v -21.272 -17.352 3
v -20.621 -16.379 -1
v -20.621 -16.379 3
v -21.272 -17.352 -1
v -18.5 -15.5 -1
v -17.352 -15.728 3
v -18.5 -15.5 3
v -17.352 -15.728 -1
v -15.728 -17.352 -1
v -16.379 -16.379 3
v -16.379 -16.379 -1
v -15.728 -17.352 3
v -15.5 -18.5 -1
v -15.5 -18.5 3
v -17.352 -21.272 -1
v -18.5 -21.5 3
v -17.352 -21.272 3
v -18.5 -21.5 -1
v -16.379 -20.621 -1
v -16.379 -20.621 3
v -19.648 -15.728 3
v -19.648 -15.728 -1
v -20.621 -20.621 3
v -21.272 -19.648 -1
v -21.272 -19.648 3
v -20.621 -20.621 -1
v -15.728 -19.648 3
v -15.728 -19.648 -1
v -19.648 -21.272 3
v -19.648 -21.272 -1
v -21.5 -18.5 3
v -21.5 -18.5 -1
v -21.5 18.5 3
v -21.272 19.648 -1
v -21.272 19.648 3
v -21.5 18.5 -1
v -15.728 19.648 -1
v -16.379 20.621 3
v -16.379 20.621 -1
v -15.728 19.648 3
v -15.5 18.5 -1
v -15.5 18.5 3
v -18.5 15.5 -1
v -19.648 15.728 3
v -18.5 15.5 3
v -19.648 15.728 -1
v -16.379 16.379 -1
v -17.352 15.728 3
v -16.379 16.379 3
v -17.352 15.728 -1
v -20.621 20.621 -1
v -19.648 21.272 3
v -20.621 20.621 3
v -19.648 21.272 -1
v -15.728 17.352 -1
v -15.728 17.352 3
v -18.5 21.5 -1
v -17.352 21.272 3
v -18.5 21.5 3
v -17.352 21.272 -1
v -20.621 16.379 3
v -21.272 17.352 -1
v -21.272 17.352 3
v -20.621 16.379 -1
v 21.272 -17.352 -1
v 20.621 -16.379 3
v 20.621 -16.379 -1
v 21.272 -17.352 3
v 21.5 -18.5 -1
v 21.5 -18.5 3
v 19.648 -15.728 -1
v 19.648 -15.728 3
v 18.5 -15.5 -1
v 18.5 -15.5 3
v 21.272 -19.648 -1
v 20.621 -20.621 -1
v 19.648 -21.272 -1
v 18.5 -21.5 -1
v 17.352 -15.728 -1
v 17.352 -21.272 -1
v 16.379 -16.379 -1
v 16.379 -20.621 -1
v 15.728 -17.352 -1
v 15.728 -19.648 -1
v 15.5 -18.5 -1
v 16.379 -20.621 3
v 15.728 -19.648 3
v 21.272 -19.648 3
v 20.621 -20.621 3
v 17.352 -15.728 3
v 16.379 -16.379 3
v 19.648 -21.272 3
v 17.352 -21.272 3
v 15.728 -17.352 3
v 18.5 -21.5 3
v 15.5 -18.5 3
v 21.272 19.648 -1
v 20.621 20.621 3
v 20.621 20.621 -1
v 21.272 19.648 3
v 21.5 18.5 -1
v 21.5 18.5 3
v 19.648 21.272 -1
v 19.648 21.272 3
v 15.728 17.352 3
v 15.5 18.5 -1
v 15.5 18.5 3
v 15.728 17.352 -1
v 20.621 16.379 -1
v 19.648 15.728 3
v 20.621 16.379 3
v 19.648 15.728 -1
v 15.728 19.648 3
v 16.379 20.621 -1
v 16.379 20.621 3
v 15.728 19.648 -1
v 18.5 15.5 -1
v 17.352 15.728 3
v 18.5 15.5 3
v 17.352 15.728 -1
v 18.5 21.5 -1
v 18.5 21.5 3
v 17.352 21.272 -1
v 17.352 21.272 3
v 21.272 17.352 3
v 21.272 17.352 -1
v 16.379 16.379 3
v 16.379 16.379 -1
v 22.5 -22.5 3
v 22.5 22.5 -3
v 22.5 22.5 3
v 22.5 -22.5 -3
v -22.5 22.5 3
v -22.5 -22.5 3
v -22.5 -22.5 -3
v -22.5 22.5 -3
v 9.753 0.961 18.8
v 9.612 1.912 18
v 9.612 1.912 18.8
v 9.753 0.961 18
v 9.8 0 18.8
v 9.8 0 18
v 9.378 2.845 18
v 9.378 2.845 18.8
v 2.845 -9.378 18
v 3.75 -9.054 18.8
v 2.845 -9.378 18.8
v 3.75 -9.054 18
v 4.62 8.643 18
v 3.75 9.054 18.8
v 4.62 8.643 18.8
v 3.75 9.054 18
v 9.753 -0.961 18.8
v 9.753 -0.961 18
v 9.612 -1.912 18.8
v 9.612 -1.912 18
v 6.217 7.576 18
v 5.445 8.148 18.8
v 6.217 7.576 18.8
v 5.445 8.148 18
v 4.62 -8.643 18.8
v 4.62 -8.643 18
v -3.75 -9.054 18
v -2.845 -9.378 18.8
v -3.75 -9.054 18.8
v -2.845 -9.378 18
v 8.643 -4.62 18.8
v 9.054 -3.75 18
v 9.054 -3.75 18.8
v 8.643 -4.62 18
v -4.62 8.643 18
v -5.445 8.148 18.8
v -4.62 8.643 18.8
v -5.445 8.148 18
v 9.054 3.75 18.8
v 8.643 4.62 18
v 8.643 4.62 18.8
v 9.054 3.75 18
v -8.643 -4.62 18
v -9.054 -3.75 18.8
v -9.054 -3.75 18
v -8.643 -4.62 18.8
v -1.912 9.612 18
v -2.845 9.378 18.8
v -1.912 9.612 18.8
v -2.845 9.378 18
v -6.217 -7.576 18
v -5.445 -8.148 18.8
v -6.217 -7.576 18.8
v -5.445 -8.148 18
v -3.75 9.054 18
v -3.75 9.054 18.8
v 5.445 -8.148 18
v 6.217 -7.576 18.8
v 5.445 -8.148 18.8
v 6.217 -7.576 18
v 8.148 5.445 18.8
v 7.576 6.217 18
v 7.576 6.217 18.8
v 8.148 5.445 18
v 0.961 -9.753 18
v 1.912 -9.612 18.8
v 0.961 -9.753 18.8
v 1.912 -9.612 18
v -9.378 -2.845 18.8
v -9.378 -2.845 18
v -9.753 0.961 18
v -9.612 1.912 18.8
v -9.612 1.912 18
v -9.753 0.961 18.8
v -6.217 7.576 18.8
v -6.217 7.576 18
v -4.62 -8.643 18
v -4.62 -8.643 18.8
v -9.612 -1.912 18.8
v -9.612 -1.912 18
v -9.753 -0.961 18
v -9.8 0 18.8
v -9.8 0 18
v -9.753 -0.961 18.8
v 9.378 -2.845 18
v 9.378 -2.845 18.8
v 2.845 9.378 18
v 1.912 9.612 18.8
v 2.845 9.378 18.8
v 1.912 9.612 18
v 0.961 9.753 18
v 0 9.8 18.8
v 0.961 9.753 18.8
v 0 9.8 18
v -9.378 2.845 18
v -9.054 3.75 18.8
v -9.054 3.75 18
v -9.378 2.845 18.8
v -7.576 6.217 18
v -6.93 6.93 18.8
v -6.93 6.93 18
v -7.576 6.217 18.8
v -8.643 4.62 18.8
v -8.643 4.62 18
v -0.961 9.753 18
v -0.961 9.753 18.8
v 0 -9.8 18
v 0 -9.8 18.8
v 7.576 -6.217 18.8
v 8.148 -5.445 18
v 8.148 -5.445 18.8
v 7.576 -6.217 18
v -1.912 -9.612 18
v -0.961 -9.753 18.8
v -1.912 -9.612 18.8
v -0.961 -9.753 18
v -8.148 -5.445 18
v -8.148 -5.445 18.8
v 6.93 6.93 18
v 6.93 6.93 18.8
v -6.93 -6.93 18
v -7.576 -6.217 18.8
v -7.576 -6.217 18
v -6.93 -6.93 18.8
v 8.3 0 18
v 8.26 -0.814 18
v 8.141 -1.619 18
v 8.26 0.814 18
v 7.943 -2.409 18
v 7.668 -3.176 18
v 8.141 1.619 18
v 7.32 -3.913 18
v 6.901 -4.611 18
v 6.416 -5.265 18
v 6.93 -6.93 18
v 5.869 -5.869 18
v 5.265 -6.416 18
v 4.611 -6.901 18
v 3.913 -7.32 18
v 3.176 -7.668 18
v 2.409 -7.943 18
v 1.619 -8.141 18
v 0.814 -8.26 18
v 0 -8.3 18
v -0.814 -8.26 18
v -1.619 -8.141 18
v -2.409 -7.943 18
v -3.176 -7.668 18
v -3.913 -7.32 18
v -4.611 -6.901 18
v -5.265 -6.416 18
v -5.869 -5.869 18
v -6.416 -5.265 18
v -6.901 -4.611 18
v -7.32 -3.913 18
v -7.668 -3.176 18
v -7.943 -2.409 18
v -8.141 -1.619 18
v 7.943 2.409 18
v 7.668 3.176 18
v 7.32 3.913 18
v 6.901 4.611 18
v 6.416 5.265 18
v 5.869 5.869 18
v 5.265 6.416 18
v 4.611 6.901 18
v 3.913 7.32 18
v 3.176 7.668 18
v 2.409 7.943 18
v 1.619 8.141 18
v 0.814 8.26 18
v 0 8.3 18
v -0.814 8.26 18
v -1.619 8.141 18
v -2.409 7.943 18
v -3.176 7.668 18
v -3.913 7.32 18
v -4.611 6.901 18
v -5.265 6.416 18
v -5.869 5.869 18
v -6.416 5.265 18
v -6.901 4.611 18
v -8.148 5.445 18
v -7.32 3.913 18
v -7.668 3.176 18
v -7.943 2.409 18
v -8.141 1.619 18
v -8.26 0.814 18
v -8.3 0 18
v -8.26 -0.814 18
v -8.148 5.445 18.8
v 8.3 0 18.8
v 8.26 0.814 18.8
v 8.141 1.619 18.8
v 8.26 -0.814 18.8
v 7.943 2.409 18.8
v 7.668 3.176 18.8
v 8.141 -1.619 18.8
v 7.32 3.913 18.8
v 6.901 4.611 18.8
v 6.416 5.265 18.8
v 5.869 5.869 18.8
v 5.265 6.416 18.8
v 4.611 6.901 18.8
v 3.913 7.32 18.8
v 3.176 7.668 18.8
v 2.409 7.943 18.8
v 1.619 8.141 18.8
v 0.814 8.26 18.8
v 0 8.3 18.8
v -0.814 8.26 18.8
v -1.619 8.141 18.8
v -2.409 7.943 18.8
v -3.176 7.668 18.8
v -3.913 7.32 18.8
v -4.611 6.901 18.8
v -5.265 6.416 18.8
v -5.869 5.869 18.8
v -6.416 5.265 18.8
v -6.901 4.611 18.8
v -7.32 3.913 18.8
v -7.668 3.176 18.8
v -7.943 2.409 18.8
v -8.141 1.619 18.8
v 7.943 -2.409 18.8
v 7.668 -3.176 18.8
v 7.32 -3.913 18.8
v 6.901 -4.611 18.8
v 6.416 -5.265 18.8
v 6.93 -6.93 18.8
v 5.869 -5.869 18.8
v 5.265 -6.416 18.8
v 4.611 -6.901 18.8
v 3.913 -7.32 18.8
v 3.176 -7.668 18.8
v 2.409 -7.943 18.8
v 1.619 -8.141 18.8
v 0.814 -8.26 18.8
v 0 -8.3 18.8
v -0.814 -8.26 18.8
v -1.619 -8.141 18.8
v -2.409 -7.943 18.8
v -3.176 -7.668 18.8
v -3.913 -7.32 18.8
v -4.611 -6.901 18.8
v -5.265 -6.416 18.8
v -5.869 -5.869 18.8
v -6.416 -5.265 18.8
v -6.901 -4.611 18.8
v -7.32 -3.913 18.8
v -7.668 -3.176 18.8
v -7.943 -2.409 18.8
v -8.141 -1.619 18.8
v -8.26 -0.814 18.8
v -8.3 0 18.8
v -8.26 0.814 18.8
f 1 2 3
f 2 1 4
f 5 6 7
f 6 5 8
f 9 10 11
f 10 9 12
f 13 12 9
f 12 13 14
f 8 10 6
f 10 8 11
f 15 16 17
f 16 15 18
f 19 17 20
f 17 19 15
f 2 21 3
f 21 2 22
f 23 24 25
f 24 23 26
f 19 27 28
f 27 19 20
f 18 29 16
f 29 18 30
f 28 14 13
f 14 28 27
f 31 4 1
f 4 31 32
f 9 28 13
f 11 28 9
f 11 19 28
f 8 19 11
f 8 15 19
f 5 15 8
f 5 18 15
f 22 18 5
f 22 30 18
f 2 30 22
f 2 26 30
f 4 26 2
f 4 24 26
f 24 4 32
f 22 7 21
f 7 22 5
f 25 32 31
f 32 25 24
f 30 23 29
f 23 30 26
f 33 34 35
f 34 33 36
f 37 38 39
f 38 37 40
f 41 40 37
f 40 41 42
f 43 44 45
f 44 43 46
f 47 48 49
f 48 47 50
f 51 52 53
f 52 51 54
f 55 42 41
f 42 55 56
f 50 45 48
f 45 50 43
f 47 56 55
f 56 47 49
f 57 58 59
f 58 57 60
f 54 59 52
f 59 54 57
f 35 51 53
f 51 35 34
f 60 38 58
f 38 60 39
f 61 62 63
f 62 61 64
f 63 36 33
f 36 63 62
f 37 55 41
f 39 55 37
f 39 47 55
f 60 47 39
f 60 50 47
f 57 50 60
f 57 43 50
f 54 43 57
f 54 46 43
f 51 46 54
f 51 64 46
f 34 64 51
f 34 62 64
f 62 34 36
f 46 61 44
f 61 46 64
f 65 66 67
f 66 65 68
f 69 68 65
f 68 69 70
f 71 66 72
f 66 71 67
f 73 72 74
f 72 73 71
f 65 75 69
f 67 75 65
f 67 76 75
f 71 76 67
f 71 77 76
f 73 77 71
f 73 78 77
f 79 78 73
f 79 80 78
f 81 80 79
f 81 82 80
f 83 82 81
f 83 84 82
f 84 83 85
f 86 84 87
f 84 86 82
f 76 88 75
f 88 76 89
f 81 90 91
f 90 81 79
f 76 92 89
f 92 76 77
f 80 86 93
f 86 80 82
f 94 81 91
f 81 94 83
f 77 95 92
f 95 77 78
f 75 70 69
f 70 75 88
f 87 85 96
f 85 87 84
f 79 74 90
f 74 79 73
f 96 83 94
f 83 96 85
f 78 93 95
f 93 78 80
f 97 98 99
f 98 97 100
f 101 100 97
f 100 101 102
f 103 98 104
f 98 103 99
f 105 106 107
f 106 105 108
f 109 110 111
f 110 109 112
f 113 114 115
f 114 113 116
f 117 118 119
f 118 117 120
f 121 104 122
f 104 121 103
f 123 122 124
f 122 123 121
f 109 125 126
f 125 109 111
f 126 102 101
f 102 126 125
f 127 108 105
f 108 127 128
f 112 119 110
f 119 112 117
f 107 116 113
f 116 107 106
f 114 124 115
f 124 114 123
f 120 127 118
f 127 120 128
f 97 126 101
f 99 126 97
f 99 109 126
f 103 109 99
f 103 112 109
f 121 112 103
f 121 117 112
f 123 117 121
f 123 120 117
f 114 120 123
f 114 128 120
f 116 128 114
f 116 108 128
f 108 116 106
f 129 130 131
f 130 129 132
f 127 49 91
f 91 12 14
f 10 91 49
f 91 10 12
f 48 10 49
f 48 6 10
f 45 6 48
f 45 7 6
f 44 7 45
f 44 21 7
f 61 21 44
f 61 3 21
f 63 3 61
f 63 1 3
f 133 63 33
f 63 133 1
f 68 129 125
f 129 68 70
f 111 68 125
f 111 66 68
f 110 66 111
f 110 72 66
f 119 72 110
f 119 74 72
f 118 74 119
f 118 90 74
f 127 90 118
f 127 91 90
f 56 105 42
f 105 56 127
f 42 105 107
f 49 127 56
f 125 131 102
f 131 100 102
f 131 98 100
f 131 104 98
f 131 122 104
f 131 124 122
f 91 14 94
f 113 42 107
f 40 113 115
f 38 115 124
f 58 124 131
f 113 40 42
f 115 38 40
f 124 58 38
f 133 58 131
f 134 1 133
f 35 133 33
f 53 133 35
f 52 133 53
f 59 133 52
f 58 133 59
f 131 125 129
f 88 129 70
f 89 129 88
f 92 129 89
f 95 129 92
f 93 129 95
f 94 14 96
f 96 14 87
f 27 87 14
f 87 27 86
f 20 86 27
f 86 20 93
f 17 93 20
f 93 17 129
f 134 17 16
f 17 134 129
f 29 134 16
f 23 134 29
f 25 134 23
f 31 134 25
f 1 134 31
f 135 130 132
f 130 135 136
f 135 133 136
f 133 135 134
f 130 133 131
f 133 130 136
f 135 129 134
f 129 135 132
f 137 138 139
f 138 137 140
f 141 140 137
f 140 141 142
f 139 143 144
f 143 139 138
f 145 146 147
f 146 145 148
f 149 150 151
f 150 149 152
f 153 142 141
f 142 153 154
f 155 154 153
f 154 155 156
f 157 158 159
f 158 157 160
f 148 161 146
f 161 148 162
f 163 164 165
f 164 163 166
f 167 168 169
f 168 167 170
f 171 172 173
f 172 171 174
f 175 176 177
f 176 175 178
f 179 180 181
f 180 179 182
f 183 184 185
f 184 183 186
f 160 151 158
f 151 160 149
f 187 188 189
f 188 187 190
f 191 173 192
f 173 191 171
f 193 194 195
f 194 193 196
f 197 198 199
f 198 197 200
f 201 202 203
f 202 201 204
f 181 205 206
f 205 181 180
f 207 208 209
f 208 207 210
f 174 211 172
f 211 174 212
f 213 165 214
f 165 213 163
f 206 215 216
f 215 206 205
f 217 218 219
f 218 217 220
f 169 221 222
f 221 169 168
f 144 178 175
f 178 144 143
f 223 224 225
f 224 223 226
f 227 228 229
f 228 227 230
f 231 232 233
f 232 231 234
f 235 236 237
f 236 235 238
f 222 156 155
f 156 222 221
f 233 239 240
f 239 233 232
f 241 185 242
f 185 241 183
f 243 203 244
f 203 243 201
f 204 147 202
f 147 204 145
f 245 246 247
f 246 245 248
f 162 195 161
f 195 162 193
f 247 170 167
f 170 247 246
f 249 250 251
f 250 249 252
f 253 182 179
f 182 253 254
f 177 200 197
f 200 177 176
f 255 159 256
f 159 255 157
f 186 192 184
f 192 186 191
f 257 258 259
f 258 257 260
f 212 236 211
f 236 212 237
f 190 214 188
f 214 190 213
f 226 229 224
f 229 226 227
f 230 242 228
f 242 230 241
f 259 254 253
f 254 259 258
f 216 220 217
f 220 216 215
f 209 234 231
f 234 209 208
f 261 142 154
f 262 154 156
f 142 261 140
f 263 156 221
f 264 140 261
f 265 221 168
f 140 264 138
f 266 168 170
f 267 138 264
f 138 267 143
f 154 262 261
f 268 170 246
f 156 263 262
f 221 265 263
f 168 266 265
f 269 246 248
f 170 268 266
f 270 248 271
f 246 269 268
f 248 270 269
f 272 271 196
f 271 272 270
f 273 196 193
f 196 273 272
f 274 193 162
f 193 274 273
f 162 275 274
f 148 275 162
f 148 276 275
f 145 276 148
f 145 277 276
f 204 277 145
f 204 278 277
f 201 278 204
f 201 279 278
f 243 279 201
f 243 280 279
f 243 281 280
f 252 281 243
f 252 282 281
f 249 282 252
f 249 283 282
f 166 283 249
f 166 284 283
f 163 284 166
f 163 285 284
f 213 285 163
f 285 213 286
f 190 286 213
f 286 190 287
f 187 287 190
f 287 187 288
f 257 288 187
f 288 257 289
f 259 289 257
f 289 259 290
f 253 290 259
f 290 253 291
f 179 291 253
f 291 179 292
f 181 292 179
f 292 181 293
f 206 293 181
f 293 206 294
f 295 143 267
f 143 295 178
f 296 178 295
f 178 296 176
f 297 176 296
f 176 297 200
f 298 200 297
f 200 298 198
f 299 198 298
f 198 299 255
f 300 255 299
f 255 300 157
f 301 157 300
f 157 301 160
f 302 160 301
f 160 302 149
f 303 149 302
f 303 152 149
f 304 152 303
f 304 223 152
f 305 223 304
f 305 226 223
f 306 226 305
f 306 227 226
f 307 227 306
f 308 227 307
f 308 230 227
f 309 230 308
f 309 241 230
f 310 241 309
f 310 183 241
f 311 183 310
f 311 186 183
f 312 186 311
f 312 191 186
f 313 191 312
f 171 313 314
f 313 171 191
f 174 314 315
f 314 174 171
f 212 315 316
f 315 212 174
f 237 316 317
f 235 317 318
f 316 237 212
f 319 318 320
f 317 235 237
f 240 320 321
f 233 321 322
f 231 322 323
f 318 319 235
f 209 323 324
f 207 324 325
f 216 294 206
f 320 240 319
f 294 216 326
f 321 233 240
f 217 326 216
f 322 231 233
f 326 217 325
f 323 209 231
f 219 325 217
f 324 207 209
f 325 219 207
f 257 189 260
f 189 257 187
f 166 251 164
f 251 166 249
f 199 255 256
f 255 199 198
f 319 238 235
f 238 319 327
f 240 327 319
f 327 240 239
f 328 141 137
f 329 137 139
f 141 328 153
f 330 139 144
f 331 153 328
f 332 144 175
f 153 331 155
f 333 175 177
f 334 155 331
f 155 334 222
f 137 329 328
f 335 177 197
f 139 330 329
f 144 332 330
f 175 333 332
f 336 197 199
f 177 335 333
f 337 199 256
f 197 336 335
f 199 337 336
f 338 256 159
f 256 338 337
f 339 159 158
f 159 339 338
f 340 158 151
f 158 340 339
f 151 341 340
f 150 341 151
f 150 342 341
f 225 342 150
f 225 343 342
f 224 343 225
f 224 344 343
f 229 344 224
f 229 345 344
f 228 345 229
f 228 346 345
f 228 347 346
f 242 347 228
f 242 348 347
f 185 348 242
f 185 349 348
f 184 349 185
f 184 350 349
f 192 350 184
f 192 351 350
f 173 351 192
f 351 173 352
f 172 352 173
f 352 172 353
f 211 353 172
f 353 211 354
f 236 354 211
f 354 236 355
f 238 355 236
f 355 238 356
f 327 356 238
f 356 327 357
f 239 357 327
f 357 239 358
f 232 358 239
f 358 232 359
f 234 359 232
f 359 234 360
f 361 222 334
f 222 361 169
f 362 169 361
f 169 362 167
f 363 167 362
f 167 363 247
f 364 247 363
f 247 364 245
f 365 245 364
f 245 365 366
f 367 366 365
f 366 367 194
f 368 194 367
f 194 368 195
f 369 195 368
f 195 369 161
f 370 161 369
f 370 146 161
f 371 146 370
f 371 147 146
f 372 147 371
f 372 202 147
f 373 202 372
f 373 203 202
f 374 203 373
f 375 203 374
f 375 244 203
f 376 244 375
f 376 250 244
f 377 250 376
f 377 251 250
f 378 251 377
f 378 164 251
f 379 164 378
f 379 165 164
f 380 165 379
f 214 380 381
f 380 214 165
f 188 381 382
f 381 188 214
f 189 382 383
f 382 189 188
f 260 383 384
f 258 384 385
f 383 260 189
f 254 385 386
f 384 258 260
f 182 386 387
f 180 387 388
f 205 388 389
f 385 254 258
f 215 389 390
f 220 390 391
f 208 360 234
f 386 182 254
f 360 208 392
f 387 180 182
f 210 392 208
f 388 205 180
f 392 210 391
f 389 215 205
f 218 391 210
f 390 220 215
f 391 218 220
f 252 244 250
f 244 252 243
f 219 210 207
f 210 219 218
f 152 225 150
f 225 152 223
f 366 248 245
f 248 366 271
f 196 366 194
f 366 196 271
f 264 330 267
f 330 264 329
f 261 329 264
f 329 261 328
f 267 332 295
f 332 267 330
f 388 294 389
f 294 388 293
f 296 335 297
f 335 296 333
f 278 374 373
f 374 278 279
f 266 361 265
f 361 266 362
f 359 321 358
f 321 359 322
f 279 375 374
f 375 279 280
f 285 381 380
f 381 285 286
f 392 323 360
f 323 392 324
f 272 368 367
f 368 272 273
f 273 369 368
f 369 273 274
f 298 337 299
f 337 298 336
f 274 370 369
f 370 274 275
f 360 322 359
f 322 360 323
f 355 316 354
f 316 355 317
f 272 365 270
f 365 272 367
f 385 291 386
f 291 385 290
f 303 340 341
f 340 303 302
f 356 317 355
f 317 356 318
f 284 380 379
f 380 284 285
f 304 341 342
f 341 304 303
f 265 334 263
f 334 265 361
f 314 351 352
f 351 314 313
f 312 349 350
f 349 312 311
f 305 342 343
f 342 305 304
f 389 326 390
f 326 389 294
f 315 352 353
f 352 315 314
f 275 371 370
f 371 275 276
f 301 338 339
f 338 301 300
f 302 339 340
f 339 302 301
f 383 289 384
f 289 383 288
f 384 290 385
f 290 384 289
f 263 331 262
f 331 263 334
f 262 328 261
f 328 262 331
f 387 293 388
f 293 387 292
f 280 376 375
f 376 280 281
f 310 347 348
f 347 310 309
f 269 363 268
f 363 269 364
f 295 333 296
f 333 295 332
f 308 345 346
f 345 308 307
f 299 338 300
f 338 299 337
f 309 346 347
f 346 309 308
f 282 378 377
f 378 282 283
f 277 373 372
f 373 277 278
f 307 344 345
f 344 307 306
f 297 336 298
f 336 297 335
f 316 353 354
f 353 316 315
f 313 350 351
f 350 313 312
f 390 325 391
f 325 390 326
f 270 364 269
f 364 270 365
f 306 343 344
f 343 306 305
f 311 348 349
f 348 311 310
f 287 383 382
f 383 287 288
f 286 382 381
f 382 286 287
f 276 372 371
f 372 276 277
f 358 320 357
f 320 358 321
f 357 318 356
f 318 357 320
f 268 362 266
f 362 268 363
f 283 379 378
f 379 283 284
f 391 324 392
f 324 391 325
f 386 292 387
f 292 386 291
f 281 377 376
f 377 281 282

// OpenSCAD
// Carpet Sensor Bore-Fit Jig (HTW HT-300PLTR1612-1-class, Ø16 × 12)
// ===========================================================================
// Fit-check jig for the BOM "Carpet sensor — Ultrasonic 300kHz" transducer.
// Tests that a printed Ø(16 + clearance) bore retains the Ø16 body with the
// expected interference and that the wire can exit cleanly.
//
// Parameter provenance mirrors carpet-sensor-ht-300pltr1612.scad:
//   body_dia 16 mm   — (datasheet: HTW "Diameter | mm | 16"; ISSR naming "16")
//   body_h   12 mm   — (datasheet: HTW "Height | mm | 12")
// Everything else (estimate) — tune to your printer + actual part.
//
// Pass criteria + fail→fix mapping: PRINT-TEST.md Jig 13.
// License: CC BY-SA 4.0

$fn = 64;

/* [Jig dimensions — EDIT] */
body_dia        = 16.0;  // (datasheet: transducer body Ø)
body_h          = 12.0;  // (datasheet: transducer body height)
bore_clearance  = 0.6;   // (estimate) DIAMETRAL clearance: bore Ø = body + this
                         //   Start 0.6mm; tight→0.4, loose→0.8-1.0 (see Jig 13)
retain_collar_h = 3.0;   // (estimate) interference band height at bore top
collar_reduce   = 0.3;   // (estimate) per-side interference of collar band

// --- Jig plate ---
plate_xy  = 45;         // footprint (mm)
plate_z   = 6;          // base thickness below bore
bore_depth = body_h + 4; // bore depth (mm) — full body seat + reveal

module base_plate() {
    difference() {
        cube([plate_xy, plate_xy, plate_z], center = true);
        // 4 corner reliefs to reduce warp
        for (dx = [-1, 1], dy = [-1, 1])
            translate([dx * (plate_xy/2 - 4), dy * (plate_xy/2 - 4), -1])
                cylinder(d = 6, h = plate_z + 2, $fn = 16);
    }
}

module bore() {
    // Main bore: body_dia + clearance, full depth.
    bore_d = body_dia + bore_clearance;
    translate([0, 0, plate_z])
        cylinder(d = bore_d, h = bore_depth + 1);
    // Interference collar at top of bore (retention test, 3mm band):
    coll_d = body_dia + bore_clearance - 2 * collar_reduce;
    translate([0, 0, plate_z + body_h - retain_collar_h + 1])
        cylinder(d = coll_d, h = retain_collar_h + 1);
}

module wire_slot() {
    // Slot through the plate edge so a 60mm wire can exit sideways during
    // retention pull test (part must seat fully despite wire tension).
    slot_w = 3.0;  // (estimate) wider than wire_dia 1.5 (est) for slack
    translate([-plate_xy/2 - 1, -slot_w/2, plate_z - 2])
        cube([plate_xy + 2, slot_w, 3]);
    // full-depth side notch aligned with bore centerline for wire egress
    translate([-1, -slot_w/2, plate_z])
        cube([bore_depth + 2, slot_w, bore_depth]);
}

module seat_marker() {
    // Ring marker at the 12mm seat depth so the operator can confirm
    // full body seat visually.
    translate([0, 0, plate_z + body_h])
        difference() {
            cylinder(d = body_dia + bore_clearance + 3, h = 0.8);
            cylinder(d = body_dia + bore_clearance, h = 1.0);
        }
}

// ===== ASSEMBLY =====
difference() {
    base_plate();
    bore();
    wire_slot();
}
seat_marker();
